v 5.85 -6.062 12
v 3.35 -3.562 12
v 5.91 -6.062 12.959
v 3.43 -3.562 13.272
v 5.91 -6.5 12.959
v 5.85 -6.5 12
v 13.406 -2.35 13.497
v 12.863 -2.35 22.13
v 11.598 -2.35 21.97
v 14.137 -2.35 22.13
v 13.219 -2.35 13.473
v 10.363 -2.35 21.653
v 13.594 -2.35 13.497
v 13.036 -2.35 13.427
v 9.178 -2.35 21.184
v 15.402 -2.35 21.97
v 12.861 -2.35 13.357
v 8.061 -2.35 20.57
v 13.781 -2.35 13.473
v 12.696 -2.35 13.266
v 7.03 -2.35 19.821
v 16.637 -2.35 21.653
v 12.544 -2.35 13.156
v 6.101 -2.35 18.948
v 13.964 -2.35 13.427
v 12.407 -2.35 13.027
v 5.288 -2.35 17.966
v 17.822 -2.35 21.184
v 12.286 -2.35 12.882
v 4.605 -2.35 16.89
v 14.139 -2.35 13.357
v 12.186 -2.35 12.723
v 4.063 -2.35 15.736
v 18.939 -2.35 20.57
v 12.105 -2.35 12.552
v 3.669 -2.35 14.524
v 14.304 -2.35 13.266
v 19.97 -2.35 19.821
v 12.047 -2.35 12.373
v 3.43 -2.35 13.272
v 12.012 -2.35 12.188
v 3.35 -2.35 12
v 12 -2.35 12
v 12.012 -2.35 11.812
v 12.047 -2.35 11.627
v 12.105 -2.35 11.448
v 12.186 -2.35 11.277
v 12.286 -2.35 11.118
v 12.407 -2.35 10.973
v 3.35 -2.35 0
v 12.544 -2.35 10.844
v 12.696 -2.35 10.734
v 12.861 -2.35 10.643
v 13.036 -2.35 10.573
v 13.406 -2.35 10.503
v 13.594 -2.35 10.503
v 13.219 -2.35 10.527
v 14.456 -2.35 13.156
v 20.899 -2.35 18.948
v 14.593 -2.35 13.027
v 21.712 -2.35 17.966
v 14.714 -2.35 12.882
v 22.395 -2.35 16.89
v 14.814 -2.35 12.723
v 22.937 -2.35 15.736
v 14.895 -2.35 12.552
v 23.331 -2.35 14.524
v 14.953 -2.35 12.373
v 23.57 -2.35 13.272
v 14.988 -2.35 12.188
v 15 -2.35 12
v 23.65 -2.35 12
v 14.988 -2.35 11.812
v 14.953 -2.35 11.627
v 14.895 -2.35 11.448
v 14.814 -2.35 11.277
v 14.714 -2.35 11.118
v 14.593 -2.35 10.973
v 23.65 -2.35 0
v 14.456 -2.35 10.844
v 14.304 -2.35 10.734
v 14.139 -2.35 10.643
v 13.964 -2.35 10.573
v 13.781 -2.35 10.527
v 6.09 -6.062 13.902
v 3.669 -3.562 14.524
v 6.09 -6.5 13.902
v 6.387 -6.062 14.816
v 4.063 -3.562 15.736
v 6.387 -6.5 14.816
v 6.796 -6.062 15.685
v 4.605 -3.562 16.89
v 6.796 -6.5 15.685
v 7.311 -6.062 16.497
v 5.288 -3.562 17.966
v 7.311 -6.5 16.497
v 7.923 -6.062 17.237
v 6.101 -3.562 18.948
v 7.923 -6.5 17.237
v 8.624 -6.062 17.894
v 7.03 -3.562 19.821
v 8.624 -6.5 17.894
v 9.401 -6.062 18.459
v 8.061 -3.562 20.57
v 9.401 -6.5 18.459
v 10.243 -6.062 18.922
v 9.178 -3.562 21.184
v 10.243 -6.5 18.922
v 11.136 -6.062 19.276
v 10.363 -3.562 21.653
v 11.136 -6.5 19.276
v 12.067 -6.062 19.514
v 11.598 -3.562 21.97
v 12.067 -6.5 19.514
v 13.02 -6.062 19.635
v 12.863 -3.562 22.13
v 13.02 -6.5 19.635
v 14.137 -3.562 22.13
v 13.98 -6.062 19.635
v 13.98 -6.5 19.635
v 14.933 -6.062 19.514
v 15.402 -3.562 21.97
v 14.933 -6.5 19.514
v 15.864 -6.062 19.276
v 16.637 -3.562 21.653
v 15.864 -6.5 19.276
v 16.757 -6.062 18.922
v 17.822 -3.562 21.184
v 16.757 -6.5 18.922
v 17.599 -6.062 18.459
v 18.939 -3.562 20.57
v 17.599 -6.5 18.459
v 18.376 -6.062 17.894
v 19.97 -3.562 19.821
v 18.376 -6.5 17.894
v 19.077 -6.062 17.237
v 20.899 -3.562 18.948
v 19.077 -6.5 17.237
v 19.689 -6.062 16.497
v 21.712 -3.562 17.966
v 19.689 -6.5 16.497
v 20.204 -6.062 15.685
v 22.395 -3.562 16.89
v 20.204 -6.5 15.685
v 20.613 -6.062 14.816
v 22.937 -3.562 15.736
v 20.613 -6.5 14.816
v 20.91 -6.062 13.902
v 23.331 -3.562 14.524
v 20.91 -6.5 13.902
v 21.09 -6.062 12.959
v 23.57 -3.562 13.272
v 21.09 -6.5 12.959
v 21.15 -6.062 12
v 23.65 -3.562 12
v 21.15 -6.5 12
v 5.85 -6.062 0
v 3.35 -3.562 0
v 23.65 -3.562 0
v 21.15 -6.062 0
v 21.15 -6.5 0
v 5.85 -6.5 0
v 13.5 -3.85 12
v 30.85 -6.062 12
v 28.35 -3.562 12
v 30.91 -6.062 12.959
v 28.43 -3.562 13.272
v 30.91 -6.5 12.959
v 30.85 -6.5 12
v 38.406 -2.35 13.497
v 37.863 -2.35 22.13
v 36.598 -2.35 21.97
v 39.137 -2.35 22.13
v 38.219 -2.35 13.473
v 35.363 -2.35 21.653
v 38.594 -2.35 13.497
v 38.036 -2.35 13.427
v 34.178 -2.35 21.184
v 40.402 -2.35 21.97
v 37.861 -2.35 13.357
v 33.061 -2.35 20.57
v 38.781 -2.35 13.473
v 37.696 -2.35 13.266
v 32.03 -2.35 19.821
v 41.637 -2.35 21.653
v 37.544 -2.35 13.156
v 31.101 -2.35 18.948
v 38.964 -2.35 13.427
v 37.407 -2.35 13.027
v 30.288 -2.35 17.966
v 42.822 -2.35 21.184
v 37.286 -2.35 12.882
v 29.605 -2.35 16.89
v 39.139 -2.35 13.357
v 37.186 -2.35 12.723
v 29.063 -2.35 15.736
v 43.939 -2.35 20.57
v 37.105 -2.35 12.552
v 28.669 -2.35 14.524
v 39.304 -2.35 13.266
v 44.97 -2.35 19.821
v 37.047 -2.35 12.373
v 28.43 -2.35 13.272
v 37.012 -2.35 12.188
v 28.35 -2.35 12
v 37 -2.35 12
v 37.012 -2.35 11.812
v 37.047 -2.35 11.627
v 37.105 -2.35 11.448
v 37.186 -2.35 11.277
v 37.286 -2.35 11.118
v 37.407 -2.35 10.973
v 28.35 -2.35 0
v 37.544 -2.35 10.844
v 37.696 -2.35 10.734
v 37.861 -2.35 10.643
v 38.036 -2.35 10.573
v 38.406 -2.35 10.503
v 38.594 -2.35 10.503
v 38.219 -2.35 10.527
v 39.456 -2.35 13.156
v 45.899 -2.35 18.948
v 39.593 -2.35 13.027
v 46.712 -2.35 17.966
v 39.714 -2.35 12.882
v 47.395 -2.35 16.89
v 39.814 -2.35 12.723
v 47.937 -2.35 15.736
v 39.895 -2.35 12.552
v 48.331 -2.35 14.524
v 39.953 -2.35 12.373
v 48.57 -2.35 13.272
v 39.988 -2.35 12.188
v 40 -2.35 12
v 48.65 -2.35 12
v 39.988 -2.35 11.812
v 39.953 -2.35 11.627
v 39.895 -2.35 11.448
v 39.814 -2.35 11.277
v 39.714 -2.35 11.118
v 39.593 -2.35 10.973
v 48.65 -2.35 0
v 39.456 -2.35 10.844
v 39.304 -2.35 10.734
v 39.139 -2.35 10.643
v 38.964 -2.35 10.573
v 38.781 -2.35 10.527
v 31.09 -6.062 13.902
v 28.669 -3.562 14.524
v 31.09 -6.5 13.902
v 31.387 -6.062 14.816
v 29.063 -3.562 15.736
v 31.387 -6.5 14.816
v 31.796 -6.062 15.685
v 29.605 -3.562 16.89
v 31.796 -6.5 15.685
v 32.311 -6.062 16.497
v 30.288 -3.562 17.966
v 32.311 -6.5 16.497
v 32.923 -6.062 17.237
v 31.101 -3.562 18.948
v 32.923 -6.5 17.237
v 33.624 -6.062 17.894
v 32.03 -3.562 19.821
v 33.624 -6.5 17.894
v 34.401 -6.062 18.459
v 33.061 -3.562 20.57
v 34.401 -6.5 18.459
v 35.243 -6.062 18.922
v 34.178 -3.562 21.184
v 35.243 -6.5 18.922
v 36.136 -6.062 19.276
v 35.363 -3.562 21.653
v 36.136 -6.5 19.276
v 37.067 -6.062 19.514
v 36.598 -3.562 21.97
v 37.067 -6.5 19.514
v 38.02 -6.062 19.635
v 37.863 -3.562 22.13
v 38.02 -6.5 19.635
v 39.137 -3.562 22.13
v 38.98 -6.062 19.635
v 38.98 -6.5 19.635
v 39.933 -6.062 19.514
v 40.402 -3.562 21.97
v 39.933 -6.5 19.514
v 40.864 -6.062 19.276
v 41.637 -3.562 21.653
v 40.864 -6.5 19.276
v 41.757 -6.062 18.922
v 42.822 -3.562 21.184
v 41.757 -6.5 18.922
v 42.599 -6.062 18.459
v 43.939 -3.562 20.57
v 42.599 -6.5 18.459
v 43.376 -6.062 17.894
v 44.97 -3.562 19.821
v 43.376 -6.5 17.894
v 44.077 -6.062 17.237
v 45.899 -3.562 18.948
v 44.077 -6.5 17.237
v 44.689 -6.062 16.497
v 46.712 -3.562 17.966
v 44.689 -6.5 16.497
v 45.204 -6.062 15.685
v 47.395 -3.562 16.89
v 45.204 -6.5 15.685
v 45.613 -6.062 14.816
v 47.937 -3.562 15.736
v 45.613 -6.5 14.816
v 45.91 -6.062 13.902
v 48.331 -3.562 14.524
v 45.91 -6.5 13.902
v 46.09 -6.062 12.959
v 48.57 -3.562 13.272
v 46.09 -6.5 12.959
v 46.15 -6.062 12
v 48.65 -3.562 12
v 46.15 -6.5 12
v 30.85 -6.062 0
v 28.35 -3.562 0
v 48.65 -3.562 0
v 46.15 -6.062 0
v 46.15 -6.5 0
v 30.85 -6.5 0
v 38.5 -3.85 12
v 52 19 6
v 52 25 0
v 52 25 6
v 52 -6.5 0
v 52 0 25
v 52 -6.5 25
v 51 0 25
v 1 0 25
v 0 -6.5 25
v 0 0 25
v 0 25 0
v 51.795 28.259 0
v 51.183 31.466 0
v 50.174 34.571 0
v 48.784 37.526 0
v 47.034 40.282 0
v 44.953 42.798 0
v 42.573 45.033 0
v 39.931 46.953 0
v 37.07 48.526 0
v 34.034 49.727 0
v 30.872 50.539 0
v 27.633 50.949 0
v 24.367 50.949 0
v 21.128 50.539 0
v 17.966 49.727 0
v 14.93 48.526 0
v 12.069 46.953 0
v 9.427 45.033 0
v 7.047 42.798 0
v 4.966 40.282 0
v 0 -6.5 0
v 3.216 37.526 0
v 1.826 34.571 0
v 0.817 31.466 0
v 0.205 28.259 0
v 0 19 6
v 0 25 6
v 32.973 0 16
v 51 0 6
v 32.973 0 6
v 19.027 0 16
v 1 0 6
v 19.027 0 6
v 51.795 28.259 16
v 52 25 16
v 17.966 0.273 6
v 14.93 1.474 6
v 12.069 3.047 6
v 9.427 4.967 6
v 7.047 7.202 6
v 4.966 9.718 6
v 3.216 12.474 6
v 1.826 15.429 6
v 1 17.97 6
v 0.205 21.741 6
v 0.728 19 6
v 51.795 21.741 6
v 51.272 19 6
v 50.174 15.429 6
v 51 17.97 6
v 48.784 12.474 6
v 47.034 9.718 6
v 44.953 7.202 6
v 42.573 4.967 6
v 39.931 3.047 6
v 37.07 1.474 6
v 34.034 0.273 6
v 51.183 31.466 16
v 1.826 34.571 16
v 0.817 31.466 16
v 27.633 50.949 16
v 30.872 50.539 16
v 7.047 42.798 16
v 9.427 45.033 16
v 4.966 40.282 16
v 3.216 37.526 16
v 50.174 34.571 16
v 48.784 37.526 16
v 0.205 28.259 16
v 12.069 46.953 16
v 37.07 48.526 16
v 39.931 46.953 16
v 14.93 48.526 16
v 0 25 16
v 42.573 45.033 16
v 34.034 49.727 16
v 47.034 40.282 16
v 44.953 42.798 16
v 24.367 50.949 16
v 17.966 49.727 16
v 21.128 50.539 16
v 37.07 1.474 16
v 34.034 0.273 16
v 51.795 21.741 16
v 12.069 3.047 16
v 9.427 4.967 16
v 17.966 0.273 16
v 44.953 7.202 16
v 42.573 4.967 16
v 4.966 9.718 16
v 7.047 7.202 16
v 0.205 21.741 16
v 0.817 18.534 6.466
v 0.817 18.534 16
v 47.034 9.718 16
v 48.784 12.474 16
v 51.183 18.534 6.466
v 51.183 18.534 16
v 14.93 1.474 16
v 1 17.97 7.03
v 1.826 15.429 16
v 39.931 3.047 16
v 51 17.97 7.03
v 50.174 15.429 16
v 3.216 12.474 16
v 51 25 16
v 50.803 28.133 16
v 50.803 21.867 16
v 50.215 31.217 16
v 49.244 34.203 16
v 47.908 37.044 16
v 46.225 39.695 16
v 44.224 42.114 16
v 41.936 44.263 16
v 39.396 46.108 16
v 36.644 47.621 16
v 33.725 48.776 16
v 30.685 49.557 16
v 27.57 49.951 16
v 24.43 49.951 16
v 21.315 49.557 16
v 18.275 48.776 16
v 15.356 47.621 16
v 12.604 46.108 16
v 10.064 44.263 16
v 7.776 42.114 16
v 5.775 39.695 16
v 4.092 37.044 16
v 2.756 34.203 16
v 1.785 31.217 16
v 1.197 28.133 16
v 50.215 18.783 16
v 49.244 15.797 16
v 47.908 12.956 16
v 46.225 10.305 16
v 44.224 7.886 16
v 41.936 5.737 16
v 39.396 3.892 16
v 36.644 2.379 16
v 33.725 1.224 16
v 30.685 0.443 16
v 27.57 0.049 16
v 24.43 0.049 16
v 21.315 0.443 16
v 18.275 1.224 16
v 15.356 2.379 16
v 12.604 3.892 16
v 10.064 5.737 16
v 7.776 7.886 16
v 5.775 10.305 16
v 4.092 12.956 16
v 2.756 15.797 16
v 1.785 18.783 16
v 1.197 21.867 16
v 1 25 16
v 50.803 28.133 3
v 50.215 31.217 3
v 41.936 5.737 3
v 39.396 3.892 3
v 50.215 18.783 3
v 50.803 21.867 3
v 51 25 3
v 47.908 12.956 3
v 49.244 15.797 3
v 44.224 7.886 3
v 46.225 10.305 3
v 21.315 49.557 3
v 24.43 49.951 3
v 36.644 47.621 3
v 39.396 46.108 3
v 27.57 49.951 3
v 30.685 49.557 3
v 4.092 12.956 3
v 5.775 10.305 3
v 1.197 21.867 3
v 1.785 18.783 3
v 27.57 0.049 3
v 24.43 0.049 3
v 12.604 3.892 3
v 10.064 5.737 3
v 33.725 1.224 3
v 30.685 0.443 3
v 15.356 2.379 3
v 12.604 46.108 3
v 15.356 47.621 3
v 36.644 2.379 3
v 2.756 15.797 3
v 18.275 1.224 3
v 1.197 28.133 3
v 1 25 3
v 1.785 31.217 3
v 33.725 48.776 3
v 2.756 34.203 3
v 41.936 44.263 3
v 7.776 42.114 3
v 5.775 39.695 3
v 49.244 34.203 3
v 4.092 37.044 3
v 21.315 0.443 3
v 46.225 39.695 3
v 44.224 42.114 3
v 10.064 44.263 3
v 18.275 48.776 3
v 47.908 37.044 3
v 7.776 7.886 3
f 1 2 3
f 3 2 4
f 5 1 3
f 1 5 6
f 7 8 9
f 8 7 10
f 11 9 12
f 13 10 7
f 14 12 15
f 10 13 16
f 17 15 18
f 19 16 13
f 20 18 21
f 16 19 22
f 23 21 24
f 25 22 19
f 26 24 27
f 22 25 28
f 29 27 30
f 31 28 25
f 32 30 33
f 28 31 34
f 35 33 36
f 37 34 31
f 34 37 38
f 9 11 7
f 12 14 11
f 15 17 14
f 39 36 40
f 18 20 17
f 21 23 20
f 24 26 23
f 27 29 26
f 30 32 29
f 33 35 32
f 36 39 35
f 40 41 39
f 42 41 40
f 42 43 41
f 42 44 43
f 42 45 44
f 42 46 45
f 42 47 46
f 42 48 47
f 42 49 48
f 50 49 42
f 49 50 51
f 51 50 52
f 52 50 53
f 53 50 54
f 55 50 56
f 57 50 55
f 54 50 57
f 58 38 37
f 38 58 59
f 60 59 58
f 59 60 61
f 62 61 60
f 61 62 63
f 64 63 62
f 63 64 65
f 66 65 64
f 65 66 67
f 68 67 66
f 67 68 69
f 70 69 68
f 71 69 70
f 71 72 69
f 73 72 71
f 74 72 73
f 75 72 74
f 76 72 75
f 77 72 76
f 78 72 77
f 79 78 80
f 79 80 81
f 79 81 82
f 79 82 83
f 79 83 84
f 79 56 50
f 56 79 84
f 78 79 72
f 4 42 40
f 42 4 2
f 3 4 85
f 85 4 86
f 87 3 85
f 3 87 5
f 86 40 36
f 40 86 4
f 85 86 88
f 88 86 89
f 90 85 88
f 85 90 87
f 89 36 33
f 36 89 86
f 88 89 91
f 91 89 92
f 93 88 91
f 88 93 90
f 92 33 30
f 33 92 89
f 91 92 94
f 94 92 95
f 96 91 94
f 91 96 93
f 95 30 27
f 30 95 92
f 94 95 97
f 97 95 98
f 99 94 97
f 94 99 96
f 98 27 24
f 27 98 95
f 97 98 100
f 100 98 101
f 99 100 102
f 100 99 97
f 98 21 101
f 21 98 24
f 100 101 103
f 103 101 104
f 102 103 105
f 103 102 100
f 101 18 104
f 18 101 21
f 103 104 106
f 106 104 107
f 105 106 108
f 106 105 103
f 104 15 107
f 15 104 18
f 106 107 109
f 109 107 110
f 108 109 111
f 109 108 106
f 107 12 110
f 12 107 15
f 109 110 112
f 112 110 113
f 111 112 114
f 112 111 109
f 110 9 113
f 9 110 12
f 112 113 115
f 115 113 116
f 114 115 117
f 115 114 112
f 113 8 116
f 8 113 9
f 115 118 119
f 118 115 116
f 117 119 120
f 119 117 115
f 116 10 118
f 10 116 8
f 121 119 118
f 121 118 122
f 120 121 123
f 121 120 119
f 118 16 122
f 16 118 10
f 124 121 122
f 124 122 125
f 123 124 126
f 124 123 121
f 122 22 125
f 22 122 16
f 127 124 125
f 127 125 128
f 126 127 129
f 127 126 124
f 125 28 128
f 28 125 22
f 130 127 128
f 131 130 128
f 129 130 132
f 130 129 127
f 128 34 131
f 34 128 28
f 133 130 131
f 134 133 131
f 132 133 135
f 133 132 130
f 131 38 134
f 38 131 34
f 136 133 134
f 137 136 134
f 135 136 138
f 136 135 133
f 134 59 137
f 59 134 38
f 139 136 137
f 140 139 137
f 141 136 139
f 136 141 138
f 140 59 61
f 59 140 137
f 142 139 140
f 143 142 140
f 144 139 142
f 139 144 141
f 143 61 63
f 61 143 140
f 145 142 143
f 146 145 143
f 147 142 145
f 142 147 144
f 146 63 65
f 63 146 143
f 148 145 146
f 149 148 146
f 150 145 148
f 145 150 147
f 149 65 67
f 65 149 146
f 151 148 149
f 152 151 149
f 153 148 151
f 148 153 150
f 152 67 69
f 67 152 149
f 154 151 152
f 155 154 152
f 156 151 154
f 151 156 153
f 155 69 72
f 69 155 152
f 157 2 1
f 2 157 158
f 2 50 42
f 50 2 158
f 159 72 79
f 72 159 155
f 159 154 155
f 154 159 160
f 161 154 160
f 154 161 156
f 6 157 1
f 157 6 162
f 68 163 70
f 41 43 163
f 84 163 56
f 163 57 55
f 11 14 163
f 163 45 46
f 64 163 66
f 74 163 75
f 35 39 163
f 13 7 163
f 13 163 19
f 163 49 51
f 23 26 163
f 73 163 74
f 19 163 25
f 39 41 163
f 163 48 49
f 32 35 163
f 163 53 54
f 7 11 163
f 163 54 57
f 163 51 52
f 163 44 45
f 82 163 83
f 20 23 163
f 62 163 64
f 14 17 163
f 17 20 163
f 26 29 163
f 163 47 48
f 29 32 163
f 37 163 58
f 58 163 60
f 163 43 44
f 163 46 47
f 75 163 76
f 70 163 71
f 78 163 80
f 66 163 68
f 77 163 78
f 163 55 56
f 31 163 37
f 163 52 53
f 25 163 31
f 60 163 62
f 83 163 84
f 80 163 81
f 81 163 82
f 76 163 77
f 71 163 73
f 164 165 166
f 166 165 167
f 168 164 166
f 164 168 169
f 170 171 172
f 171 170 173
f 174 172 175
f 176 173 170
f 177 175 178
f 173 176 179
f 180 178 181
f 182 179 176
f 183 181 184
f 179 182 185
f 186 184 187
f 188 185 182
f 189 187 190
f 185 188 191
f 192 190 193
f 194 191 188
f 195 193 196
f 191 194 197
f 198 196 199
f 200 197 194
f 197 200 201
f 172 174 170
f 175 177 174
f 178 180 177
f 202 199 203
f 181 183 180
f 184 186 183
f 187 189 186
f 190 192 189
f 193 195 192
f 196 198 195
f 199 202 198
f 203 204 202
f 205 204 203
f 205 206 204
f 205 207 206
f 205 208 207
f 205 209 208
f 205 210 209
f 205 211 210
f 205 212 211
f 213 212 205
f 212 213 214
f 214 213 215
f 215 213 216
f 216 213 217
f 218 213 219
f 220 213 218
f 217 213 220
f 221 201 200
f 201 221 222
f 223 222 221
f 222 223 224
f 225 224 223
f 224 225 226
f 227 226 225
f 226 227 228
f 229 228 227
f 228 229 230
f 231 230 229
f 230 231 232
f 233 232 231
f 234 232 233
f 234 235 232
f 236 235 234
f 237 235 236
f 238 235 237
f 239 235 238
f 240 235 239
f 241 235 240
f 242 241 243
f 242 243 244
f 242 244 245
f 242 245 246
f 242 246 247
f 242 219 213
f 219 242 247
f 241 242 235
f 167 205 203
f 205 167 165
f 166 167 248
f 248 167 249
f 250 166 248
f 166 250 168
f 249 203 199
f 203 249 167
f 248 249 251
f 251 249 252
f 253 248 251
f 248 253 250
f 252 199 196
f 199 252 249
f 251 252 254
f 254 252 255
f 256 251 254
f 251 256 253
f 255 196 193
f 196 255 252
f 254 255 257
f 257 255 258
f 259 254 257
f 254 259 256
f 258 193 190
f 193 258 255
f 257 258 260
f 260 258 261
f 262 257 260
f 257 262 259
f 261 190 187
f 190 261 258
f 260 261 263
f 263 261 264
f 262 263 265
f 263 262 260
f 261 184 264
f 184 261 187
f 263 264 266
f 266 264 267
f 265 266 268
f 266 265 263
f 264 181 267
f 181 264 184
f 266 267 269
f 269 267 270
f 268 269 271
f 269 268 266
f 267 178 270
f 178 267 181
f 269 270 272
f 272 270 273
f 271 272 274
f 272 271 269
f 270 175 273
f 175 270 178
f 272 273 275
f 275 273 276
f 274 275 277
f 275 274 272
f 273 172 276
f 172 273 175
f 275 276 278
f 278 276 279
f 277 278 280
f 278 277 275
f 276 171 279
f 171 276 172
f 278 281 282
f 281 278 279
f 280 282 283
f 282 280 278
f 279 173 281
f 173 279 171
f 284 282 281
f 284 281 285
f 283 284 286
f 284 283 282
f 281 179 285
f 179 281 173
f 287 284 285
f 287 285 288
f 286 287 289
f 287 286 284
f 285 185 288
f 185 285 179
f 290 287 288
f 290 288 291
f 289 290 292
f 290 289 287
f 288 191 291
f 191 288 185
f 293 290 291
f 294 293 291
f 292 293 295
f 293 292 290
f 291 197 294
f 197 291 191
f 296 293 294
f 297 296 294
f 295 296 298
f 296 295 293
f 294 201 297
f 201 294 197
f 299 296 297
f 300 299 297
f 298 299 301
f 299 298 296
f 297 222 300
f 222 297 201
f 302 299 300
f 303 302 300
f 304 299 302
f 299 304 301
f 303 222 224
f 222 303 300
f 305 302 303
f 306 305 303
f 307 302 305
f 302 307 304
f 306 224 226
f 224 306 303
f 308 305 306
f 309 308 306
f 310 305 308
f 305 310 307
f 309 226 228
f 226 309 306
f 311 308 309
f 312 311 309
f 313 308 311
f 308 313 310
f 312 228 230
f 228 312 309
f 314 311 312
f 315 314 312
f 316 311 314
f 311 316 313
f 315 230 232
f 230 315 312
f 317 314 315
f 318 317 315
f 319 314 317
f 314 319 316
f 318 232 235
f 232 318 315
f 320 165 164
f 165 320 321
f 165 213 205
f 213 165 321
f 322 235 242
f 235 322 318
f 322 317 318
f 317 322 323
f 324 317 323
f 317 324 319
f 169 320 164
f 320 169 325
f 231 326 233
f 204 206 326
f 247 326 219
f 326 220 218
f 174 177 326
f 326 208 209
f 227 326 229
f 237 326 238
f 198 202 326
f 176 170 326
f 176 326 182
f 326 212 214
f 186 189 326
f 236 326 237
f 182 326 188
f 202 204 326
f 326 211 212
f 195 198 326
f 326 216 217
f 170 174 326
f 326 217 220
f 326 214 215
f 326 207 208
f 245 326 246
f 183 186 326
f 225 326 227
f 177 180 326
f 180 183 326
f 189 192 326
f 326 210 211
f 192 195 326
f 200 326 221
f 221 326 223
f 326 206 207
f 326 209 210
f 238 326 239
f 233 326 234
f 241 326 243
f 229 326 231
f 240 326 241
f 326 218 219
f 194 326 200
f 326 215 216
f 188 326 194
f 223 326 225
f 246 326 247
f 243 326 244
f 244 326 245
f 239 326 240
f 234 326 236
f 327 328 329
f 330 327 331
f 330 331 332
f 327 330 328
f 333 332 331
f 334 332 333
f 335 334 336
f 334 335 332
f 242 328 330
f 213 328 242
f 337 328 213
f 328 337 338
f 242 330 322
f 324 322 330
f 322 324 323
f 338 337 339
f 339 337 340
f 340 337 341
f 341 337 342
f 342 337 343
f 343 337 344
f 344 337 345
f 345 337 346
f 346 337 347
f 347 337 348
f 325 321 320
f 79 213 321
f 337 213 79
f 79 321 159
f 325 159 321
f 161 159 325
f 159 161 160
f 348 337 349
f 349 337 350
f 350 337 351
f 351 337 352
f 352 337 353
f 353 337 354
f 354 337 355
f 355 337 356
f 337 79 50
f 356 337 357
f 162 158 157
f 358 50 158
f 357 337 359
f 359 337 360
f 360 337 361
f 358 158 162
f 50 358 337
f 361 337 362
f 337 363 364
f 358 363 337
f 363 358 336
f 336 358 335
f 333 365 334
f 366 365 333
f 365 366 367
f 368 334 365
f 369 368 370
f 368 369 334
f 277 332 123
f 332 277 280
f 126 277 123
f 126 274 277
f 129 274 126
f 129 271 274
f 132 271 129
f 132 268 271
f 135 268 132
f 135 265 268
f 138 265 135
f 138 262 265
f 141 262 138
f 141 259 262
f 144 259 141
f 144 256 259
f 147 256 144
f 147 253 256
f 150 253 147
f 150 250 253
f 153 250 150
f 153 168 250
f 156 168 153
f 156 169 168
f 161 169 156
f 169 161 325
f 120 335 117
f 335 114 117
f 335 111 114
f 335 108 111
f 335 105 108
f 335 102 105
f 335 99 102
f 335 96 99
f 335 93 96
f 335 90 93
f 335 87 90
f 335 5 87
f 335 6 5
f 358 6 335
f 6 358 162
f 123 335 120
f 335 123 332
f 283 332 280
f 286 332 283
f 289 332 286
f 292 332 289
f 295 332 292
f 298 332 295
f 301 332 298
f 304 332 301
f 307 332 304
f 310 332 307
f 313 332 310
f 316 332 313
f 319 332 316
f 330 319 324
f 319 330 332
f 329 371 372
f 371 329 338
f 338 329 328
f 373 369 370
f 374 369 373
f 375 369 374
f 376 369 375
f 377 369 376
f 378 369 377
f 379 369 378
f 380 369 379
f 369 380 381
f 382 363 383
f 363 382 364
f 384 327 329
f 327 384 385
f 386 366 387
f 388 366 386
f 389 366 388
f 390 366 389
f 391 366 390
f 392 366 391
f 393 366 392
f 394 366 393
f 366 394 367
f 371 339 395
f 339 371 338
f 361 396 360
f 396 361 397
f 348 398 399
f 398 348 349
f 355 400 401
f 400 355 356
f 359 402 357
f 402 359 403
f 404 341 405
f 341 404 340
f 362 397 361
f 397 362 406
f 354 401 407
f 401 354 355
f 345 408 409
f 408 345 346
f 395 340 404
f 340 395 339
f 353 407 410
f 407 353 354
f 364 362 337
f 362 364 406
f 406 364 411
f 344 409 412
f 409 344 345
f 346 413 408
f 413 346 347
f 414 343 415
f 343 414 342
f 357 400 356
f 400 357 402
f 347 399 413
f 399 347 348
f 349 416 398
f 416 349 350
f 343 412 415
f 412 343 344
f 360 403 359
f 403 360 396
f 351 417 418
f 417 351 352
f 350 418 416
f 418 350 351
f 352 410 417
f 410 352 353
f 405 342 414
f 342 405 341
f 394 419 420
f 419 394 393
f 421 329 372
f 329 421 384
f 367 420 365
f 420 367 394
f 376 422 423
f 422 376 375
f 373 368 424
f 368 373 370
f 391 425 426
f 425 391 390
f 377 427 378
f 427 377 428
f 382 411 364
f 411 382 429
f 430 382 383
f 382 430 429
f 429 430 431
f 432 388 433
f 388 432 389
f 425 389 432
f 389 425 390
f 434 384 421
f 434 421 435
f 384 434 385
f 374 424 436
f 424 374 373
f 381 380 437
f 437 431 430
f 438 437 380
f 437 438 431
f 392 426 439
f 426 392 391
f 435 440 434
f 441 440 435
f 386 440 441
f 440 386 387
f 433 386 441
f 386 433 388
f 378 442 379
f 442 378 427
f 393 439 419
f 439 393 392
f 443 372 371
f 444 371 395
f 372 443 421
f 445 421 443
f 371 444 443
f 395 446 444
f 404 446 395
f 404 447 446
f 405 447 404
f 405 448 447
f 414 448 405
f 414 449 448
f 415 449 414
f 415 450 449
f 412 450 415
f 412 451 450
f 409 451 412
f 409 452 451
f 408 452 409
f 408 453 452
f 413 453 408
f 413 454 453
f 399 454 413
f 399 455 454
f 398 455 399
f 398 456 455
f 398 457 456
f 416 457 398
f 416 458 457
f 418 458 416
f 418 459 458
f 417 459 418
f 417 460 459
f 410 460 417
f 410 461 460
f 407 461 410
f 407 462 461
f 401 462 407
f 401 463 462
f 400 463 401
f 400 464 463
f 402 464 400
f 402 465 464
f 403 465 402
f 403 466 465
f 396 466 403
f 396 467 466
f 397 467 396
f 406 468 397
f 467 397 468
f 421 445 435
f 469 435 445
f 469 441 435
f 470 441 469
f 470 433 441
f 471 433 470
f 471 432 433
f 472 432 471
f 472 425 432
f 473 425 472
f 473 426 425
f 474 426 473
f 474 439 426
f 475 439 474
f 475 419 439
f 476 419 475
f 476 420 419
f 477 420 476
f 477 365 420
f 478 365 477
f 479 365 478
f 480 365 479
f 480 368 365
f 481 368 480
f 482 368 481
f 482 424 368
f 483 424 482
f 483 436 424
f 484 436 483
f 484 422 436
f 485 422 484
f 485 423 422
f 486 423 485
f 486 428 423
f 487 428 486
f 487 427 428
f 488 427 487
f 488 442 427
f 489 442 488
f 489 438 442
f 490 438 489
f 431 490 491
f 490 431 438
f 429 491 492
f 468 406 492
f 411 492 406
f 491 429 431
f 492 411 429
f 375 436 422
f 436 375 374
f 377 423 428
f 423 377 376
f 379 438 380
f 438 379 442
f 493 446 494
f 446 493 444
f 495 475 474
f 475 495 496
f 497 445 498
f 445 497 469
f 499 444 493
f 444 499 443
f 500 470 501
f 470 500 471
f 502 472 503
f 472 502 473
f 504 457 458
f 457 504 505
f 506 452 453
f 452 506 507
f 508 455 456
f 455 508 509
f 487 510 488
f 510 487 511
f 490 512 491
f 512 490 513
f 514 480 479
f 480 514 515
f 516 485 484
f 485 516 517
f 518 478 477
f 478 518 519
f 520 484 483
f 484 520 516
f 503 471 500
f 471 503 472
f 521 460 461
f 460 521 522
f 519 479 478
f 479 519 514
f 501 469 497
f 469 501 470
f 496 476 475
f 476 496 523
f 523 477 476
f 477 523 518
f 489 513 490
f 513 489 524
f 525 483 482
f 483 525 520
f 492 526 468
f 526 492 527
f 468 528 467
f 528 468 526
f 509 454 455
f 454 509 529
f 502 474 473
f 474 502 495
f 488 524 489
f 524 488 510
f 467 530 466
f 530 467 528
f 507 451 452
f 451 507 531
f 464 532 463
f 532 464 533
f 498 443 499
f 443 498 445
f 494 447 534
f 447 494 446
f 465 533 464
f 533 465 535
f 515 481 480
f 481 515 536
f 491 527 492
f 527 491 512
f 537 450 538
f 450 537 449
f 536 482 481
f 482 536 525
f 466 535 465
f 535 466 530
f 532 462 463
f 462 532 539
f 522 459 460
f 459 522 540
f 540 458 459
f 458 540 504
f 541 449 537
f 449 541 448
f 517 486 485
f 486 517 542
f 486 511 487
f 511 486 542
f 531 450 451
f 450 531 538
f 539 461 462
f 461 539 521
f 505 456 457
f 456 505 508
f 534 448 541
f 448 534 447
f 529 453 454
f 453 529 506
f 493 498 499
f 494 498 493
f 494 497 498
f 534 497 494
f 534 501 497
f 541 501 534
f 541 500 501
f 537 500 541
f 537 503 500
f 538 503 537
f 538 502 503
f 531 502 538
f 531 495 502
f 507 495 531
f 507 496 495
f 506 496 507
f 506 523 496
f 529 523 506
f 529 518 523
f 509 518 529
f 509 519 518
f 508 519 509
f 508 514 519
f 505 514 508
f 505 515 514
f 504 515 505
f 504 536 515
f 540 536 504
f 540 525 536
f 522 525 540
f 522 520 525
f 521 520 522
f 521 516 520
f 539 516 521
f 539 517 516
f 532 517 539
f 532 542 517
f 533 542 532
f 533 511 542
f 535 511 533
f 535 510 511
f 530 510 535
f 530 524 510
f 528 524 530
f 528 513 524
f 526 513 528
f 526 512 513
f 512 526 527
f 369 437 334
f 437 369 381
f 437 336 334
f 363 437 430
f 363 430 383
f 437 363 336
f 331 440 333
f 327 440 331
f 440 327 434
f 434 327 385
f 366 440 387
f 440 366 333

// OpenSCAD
/*Created by Andy Levesque
Credit to @David D on Printables and Jonathan at Keep Making for Multiconnect and Multiboard, respectively
Licensed Creative Commons 4.0 Attribution Non-Commercial Sharable with Attribution
*/

/*[Parameters]*/
//diameter (in mm) of the item you wish to insert (this becomes the internal diameter)
itemDiameter = 50;
//thickness (in mm) of the wall surrounding the item
rimThickness = 1;
//Thickness (in mm) of the base underneath the item you are holding
baseThickness = 3;
//Additional thickness of the area between the item holding and the backer.
shelfSupportHeight = 3;
//Additional height (in mm) of the rim protruding upward to hold the item
rimHeight = 10;
//Additional Backer Height (in mm) in case you prefer additional support for something heavy
additionalBackerHeight = 0;

/* [Slot Customization] */
//Distance between Multiconnect slots on the back (25mm is standard for MultiBoard)
distanceBetweenSlots = 25;
//QuickRelease removes the small indent in the top of the slots that lock the part into place
slotQuickRelease = false;
//Dimple scale tweaks the size of the dimple in the slot for printers that need a larger dimple to print correctly
dimpleScale = 1; //[0.5:.05:1.5]
//Scale of slots in the back (1.015 scale is default per MultiConnect specs)
slotTolerance = 1.00; //[0.925:0.005:1.075]
//Move the slot in (positive) or out (negative)
slotDepthMicroadjustment = 0; //[-.5:0.05:.5]


/*[Hidden]*/
//profile coordinates for the multiconnect slot
slotProfile = [[0,0],[10.15,0],[10.15,1.2121],[7.65,3.712],[7.65,5],[0,5]];

totalWidth = itemDiameter + rimThickness*2;
totalHeight = max(baseThickness+shelfSupportHeight+0.25*itemDiameter,25);

//Thickness of the back of the item (default in 6.5mm). Changes are untested. 
backThickness = 6.5; //.1
//slot count calculates how many slots can fit on the back. Based on internal width for buffer.
slotCount = floor(max(distanceBetweenSlots,totalWidth)/distanceBetweenSlots);
echo(str("Slot Count: ",slotCount));
backWidth = max(distanceBetweenSlots,totalWidth);

//start build
union() {
    multiconnectBack(backWidth = backWidth, backHeight = totalHeight+additionalBackerHeight);
    //item holder
    difference() {
        //itemwalls
        union() {
            hull(){
                translate(v = [totalWidth/2,itemDiameter/2,0]) 
                    //outer circle
                    linear_extrude(height = shelfSupportHeight+baseThickness) 
                            circle(r = itemDiameter/2+rimThickness, $fn=50);
                    //wide back for hull operation
                    linear_extrude(height = shelfSupportHeight+baseThickness) 
                            square(size = [totalWidth,1]);
                }
            //thin holding wall
            translate(v = [totalWidth/2,itemDiameter/2,shelfSupportHeight+baseThickness]) 
                linear_extrude(height = rimHeight) 
                    circle(r = itemDiameter/2+rimThickness, $fn=50);
        }
        //itemDiameter (i.e., delete tool)
        color(c = "red") translate(v = [totalWidth/2,itemDiameter/2,baseThickness]) linear_extrude(height = shelfSupportHeight+rimHeight+1) circle(r = itemDiameter/2, $fn=50);
    }
    //brackets
    bracketSize = min(totalHeight-baseThickness-shelfSupportHeight, itemDiameter/2);
    translate(v = [rimThickness,0,bracketSize+baseThickness+shelfSupportHeight]) shelfBracket(bracketHeight = bracketSize, bracketDepth = bracketSize, rimThickness = rimThickness);
    translate(v = [rimThickness*2+itemDiameter,0,bracketSize+baseThickness+shelfSupportHeight]) shelfBracket(bracketHeight = bracketSize, bracketDepth = bracketSize, rimThickness = rimThickness);
}


//BEGIN MODULES
//Slotted back
module multiconnectBack(backWidth, backHeight)
{
    difference() {
        translate(v = [0,-6.5,0]) cube(size = [backWidth,6.5,backHeight]);
        //Loop through slots and center on the item
        //Note: I kept doing math until it looked right. It's possible this can be simplified.
        for (slotNum = [0:1:slotCount-1]) {
            translate(v = [distanceBetweenSlots/2+(backWidth/distanceBetweenSlots-slotCount)*distanceBetweenSlots/2+slotNum*distanceBetweenSlots,-2.35+slotDepthMicroadjustment,backHeight-13]) {
                color(c = "red")  slotTool(backHeight);
            }
        }
    }
    //Create Slot Tool
    module slotTool(totalHeight) {
        scale(v = slotTolerance)
        difference() {
            union() {
                //round top
                rotate(a = [90,0,0,]) 
                    rotate_extrude($fn=50) 
                        polygon(points = slotProfile);
                //long slot
                translate(v = [0,0,0]) 
                    rotate(a = [180,0,0]) 
                    linear_extrude(height = totalHeight+1) 
                        union(){
                            polygon(points = slotProfile);
                            mirror([1,0,0])
                                polygon(points = slotProfile);
                        }
            }
            //dimple
            if (slotQuickRelease == false)
                scale(v = dimpleScale) 
                rotate(a = [90,0,0,]) 
                    rotate_extrude($fn=50) 
                        polygon(points = [[0,0],[0,1.5],[1.5,0]]);
        }
    }
}

module shelfBracket(bracketHeight, bracketDepth, rimThickness){
        rotate(a = [-90,0,90]) 
            linear_extrude(height = rimThickness) 
                polygon([[0,0],[0,bracketHeight],[bracketDepth,bracketHeight]]);
}
